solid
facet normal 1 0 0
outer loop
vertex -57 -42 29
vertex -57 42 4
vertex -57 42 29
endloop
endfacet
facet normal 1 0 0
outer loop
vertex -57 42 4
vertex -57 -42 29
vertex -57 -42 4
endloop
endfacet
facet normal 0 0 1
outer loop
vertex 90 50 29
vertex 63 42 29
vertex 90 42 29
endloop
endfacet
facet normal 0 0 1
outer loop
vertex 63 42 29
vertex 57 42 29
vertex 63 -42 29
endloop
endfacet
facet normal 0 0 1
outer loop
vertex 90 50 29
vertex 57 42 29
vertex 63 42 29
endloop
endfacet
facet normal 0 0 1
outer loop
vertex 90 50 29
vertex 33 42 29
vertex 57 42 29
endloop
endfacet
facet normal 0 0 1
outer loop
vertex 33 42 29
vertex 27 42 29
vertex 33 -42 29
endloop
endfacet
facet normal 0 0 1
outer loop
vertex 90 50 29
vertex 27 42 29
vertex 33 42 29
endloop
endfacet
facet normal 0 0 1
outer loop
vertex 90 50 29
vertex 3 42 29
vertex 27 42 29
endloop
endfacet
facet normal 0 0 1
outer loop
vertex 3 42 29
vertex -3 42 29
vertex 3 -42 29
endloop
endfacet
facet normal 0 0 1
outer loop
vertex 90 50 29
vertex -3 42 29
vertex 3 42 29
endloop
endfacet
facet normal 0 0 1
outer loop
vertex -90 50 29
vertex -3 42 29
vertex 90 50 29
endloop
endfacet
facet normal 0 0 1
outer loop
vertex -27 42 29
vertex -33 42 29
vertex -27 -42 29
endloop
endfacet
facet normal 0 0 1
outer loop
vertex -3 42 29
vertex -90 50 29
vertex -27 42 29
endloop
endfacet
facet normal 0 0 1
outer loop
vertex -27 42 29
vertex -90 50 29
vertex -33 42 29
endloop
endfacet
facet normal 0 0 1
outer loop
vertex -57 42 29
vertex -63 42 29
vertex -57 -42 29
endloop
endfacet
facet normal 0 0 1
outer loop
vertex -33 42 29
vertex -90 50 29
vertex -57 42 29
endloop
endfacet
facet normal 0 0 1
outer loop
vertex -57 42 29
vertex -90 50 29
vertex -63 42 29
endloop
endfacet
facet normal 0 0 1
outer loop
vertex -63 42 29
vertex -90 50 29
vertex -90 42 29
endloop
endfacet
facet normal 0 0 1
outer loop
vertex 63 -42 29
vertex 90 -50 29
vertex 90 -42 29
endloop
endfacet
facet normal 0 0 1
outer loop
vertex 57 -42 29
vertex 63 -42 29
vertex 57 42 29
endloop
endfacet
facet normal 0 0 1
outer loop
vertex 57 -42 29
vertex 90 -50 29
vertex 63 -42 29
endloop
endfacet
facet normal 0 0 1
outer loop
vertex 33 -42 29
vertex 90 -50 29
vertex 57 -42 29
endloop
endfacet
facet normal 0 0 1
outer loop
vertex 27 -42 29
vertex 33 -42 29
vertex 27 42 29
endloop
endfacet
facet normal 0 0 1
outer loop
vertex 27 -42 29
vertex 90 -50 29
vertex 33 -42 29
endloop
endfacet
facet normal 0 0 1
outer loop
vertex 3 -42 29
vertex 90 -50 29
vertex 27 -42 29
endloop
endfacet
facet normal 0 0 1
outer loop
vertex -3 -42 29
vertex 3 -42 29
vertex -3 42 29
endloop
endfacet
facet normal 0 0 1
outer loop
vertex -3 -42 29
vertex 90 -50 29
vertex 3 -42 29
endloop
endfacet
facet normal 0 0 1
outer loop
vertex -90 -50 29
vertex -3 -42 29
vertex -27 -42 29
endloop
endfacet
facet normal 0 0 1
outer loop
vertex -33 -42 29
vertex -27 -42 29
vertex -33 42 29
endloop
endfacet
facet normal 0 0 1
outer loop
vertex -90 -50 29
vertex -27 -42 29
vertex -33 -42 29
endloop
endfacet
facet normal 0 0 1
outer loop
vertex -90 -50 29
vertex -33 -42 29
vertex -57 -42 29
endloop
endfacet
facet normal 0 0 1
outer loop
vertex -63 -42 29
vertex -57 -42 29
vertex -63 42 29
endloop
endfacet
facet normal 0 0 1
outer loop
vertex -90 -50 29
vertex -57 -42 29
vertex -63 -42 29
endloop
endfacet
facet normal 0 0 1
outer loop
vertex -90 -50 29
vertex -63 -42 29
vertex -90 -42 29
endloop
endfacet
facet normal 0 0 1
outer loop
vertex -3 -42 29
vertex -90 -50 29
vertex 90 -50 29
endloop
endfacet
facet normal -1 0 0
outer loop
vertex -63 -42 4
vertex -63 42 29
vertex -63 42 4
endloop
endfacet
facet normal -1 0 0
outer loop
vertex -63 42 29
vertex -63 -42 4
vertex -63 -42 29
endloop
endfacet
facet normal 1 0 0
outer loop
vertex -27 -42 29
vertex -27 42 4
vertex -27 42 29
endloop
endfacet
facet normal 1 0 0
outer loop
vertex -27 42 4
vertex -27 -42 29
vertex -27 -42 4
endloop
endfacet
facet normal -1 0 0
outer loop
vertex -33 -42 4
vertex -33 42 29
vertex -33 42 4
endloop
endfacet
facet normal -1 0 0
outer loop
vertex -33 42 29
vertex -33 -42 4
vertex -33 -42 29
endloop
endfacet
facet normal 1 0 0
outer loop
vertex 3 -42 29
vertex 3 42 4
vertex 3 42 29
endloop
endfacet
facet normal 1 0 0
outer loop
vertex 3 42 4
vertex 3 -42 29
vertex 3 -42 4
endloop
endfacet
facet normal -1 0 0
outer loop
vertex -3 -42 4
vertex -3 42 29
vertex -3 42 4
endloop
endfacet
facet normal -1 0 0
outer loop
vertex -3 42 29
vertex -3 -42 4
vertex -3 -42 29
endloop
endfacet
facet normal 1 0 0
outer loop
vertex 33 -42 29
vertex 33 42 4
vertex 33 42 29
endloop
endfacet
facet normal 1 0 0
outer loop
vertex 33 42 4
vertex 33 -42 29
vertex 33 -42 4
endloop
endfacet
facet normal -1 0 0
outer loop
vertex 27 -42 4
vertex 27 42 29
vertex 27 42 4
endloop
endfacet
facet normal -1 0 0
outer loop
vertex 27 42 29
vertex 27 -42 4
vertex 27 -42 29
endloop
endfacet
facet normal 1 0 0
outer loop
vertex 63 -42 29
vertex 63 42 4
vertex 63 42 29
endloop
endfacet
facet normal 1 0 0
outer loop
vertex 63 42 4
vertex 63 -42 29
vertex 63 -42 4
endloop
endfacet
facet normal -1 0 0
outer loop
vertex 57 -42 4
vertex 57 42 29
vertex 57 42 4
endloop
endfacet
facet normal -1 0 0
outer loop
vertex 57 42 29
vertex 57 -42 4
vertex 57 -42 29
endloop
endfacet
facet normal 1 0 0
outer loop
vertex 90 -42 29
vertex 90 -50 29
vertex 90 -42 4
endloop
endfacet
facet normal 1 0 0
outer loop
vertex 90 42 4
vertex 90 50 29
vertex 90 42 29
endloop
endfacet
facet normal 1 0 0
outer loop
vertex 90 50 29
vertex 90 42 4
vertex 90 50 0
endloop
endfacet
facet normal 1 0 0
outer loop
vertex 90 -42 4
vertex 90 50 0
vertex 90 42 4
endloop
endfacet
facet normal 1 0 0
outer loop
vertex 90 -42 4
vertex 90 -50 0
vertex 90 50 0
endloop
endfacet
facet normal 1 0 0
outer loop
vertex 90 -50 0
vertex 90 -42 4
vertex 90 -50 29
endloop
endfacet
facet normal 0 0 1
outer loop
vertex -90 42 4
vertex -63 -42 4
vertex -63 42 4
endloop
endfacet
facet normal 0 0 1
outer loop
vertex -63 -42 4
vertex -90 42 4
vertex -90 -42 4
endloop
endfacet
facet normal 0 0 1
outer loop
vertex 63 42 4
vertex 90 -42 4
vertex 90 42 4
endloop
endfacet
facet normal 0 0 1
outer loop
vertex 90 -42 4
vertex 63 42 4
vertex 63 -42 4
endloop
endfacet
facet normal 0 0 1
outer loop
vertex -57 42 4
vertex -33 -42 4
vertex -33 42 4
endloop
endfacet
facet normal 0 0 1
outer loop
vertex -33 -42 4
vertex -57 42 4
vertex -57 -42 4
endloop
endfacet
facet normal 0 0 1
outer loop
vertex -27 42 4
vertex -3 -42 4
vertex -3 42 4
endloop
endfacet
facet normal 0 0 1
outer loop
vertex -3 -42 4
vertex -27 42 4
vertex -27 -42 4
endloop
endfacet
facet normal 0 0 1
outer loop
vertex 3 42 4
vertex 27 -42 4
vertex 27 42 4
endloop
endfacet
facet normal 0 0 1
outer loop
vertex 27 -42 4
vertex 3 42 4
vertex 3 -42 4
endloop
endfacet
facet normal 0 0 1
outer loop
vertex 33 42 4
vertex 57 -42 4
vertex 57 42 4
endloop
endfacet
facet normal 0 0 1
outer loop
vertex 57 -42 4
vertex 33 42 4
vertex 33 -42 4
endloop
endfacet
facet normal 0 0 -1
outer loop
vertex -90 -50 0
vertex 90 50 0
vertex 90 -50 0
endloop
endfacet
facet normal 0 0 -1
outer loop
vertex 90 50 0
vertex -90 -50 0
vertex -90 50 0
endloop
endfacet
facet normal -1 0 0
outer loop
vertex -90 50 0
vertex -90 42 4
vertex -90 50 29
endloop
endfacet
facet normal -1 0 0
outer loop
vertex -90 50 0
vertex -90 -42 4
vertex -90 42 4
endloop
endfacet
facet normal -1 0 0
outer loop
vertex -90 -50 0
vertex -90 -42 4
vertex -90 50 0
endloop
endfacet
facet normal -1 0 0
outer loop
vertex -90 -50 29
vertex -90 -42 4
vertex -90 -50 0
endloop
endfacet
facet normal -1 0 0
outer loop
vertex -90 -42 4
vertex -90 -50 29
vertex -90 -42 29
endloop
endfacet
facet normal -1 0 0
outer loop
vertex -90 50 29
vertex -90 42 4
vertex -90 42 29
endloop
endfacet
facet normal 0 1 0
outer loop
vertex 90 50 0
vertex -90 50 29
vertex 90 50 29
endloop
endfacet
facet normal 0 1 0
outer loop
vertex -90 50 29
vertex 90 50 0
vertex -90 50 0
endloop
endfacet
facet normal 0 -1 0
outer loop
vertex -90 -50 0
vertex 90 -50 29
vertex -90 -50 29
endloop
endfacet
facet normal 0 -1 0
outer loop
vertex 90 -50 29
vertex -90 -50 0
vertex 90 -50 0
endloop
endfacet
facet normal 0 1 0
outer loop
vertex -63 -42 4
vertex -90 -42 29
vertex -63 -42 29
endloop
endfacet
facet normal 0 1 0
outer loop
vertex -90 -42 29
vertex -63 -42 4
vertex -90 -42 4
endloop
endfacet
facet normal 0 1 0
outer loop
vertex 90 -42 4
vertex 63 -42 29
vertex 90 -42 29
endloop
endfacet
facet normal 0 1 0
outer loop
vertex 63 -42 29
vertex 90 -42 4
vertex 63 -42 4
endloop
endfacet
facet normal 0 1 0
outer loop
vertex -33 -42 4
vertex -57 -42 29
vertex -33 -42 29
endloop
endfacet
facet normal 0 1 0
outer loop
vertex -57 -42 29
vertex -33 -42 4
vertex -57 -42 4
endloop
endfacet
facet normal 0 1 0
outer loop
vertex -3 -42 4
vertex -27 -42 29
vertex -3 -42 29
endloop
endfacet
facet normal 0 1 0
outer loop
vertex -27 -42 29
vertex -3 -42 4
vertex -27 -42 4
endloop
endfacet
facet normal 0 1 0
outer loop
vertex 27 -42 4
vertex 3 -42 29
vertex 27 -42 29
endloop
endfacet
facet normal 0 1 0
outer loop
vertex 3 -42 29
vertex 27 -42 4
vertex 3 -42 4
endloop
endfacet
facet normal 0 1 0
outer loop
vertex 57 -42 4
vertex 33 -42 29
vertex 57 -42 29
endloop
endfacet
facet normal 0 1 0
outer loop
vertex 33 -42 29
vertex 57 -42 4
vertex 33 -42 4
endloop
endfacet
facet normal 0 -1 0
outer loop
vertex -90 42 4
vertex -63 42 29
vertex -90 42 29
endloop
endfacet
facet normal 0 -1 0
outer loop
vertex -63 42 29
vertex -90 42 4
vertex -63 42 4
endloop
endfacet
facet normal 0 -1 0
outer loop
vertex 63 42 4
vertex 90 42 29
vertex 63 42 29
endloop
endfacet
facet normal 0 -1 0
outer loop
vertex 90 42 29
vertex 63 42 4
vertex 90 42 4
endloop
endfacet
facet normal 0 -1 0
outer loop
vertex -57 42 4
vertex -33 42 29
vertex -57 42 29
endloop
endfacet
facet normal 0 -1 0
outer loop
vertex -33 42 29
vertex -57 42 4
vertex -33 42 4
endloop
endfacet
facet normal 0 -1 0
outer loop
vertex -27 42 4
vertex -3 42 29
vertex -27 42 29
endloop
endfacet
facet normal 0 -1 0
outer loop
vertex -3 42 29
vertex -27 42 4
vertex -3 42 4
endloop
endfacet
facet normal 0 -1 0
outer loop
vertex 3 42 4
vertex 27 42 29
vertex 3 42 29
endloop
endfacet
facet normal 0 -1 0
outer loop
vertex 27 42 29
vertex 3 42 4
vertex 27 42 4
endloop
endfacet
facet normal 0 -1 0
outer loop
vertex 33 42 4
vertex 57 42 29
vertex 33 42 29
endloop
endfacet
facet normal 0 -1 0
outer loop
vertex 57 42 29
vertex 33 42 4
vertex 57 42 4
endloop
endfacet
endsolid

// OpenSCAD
$fn = 32;

// ----------------------------------------------------------------------
// Rib frame 180 x 100 x 29
// 5 ribs at 30 mm pitch
// ----------------------------------------------------------------------

// --- parameters (mm) ---
frame = [180, 100, 4];  // base plate size (x, y, z)
rail_w = 8;             // side rail width
ribs = 5;               // number of ribs
rib_t = 6;              // rib thickness
rib_h = 25;             // rib height above the base plate
pitch = 30;             // pitch between rib centres

// --- derived feature positions (mm) ---
span = (ribs - 1) * pitch;          // = 120   distance between the outer ribs
origin_x = -span / 2;               // = -60   X of the first rib
rib_len = frame[1] - 2 * rail_w + 2;  // = 86   rib length, 1 mm into each rail
feature_centers = [
  [origin_x + 0 * pitch, 0],
  [origin_x + 1 * pitch, 0],
  [origin_x + 2 * pitch, 0],
  [origin_x + 3 * pitch, 0],
  [origin_x + 4 * pitch, 0]
];   // rib centre line, drives the rib loop

// base plate, two side rails, then the ribs read straight off feature_centers
union() {
  translate([-frame[0] / 2, -frame[1] / 2, 0]) cube(frame);
  translate([-frame[0] / 2, -frame[1] / 2, 0]) cube([frame[0], rail_w, frame[2] + rib_h]);
  translate([-frame[0] / 2, frame[1] / 2 - rail_w, 0]) cube([frame[0], rail_w, frame[2] + rib_h]);
  for (centre = feature_centers)
    translate([centre[0] - rib_t / 2, centre[1] - rib_len / 2, frame[2] - 1])
      cube([rib_t, rib_len, rib_h + 1]);
}
